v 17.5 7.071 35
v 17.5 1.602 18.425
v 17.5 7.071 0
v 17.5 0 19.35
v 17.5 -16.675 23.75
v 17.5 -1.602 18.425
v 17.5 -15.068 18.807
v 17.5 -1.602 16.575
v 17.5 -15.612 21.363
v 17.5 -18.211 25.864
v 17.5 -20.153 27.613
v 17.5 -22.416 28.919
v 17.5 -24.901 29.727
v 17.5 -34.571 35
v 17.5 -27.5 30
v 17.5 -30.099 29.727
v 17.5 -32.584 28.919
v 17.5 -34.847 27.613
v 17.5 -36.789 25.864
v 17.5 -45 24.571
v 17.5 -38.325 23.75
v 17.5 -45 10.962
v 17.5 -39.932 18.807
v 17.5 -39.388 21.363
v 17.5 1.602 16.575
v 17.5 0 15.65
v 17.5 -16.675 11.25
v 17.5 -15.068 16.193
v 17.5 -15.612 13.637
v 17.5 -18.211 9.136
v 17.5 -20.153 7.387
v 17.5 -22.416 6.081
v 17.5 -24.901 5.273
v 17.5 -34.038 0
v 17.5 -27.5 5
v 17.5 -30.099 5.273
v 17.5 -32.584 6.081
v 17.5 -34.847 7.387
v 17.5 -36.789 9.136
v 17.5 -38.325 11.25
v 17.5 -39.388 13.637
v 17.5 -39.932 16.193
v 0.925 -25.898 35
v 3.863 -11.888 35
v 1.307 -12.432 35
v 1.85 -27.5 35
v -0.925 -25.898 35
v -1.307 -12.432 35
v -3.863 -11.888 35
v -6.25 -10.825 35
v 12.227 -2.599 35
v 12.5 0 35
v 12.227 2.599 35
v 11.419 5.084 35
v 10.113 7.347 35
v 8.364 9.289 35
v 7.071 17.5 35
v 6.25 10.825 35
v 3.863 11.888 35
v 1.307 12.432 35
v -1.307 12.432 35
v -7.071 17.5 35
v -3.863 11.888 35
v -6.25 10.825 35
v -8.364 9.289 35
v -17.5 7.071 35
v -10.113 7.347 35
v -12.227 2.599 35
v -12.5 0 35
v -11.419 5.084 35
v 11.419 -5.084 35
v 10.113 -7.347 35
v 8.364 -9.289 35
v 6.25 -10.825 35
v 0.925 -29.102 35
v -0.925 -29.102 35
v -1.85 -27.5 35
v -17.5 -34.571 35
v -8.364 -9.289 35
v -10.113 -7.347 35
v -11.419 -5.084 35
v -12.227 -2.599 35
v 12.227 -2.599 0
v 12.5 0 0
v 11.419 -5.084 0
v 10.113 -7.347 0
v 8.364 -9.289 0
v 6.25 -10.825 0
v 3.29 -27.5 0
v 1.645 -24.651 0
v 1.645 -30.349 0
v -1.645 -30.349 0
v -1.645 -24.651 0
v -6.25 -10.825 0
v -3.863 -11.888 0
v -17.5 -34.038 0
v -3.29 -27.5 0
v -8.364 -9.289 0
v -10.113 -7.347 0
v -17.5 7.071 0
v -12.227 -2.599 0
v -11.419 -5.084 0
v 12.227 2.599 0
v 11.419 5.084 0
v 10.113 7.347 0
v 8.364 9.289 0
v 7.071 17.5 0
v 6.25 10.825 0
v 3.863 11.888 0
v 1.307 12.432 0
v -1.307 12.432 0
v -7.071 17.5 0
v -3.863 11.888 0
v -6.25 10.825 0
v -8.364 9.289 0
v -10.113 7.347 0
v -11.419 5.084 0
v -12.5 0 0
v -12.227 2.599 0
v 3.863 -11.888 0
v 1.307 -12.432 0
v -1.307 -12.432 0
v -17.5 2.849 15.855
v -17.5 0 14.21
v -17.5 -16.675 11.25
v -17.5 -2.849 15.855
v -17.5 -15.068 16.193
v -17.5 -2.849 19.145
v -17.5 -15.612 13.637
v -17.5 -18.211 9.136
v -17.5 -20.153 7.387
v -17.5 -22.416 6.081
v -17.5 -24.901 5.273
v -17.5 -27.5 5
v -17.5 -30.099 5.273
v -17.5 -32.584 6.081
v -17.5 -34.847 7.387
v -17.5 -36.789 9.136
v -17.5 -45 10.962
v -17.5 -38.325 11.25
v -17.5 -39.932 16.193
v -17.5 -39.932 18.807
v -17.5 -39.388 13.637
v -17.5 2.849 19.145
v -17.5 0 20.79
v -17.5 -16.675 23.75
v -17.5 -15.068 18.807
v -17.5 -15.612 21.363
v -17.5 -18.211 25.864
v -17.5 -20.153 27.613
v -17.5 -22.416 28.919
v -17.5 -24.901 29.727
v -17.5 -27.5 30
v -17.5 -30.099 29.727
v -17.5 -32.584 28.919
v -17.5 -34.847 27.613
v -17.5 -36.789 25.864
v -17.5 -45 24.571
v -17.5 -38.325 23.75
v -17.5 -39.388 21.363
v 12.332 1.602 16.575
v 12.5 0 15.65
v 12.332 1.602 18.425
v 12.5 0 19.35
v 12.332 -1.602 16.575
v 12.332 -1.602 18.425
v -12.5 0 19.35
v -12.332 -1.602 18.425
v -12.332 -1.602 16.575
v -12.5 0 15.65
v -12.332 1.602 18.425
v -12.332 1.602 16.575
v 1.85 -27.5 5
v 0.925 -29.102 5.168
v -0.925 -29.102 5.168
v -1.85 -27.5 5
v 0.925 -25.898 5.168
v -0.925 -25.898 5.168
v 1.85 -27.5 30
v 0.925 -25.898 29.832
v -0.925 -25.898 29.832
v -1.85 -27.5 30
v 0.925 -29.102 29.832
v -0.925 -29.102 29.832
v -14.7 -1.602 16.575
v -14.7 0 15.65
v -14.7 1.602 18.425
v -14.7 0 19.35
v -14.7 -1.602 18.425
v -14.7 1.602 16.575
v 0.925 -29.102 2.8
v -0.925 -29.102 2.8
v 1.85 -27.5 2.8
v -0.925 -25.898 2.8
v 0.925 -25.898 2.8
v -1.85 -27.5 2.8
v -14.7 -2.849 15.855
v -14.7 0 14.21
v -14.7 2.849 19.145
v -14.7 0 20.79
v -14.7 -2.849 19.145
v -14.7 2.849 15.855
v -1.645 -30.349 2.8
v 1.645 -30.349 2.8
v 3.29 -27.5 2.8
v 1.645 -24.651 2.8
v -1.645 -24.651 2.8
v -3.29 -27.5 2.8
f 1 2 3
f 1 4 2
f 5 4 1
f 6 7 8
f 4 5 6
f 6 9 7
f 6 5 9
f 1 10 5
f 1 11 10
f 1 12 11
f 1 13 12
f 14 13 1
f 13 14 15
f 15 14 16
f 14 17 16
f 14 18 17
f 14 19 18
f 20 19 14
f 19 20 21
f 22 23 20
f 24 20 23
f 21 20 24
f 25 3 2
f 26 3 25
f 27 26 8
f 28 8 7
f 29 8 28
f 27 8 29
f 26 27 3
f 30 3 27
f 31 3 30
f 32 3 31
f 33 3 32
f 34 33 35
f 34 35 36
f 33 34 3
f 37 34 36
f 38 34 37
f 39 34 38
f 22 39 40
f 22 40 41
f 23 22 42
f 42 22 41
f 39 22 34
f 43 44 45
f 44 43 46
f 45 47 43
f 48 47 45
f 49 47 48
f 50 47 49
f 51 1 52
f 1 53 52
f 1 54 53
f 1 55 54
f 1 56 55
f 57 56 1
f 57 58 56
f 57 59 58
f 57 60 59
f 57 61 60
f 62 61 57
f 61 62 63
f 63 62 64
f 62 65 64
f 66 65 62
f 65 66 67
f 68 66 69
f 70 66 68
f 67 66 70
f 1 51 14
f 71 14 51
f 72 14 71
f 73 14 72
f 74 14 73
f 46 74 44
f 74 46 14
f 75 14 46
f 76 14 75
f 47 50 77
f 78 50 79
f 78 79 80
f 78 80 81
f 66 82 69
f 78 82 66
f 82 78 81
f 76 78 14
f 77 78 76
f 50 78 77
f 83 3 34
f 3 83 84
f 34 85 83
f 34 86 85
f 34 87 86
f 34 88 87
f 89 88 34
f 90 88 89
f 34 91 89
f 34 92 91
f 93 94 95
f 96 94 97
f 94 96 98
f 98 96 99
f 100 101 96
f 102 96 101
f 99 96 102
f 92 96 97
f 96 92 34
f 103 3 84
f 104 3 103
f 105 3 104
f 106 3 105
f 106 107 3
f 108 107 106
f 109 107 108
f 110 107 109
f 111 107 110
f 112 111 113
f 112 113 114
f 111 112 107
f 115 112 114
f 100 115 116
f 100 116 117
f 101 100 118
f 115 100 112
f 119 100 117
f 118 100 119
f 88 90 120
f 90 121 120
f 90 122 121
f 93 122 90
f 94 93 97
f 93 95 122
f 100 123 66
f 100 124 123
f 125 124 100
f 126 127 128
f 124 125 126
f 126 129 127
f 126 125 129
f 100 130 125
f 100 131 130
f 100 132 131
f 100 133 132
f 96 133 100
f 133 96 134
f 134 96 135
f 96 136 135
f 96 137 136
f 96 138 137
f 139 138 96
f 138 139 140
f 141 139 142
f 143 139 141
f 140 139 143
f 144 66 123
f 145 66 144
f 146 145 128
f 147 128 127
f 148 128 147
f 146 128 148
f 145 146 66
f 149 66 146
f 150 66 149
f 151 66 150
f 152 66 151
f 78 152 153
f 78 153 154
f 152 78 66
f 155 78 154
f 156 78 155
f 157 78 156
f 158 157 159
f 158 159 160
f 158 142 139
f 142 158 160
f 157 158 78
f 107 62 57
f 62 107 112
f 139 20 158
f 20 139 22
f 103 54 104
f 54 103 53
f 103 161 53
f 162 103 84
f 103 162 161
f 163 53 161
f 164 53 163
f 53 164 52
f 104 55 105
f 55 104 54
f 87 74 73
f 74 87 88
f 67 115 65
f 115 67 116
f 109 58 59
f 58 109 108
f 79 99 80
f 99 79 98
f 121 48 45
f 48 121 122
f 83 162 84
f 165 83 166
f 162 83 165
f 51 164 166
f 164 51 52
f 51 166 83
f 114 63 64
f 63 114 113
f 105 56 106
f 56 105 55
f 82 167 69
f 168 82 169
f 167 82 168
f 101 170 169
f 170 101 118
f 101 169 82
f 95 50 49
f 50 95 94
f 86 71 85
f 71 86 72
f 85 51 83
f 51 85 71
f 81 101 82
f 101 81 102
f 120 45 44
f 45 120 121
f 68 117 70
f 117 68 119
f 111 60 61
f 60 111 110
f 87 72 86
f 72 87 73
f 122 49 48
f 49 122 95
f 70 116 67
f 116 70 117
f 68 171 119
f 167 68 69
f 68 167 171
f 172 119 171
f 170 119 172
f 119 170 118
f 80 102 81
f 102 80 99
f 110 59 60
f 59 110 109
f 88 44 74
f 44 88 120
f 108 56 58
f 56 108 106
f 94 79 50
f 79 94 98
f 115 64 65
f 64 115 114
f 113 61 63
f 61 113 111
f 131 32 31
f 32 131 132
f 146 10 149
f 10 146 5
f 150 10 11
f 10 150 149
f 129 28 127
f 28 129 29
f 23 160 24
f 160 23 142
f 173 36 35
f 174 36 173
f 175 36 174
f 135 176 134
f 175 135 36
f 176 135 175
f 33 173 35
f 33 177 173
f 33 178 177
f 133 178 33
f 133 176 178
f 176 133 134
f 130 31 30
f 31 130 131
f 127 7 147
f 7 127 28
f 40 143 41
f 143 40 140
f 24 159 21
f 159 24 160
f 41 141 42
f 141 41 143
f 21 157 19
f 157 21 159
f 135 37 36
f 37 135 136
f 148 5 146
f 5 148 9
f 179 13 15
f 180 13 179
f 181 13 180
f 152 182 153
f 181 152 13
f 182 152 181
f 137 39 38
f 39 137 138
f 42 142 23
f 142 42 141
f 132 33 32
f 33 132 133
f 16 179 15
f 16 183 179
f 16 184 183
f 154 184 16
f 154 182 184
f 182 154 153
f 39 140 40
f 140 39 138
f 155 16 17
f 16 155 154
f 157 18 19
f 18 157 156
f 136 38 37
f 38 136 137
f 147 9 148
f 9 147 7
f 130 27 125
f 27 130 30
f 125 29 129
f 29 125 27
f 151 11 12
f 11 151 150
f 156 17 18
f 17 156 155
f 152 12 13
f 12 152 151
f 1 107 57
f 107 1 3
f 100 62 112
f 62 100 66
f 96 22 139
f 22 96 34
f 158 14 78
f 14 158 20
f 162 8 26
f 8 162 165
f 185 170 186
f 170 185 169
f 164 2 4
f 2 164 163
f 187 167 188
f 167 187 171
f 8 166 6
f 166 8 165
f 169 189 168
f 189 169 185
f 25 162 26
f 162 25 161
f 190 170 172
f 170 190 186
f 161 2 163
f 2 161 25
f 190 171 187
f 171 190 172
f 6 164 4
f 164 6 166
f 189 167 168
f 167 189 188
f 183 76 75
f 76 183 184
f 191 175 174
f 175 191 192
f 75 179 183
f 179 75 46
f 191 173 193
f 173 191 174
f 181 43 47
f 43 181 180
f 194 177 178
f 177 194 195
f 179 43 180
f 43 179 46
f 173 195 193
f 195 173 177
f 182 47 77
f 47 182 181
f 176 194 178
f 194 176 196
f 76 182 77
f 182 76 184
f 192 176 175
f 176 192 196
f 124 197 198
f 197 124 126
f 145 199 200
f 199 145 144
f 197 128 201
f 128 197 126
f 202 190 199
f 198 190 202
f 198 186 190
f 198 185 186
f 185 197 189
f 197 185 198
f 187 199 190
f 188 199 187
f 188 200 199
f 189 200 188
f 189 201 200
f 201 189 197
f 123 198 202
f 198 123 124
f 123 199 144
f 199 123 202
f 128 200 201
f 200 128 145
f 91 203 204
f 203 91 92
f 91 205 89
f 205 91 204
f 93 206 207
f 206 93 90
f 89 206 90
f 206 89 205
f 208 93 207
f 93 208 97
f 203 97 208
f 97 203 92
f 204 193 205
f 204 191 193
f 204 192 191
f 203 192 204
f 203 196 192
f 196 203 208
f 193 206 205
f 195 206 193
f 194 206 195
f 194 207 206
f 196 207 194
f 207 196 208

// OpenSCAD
// file: Parameters.scad
//Main tube diameter [mm]
main_tube_outer_diameter = 25;
main_tube_inner_diameter = 21;

//Tube for undercarriage [mm]
tube_for_undercarriage_outer_diameter = 10;
tube_for_undercarriage_inner_diameter = 5;

//Screw diameter in model 666_1019 [mm]
M4_screw_diameter=4;


//Screw diameter in model 666_1004 [mm]
M3_5_screw_diameter = 3.7;

//Nut in model 666_1004 [mm]
Nut_height = 2.8;
Nut_diameter = 6.58;
// main file
include <./Parameters.scad>
		
wall_thickness=main_tube_outer_diameter/5;
thickness_between_tubes=main_tube_outer_diameter/10;			
width=main_tube_outer_diameter+2*wall_thickness;
depth=main_tube_outer_diameter*2+2*wall_thickness+thickness_between_tubes;
height=width;
radius=main_tube_outer_diameter/2;



difference(){

translate([-(width/2),-(depth-radius-wall_thickness),0])
cube([width,depth,height]);

    //tube

    cylinder(h=height,r1=radius,r2=radius);

    translate([-(radius+wall_thickness),-(main_tube_outer_diameter+thickness_between_tubes),radius+wall_thickness])
    rotate([0,90,0])
    cylinder(h=height,r1=radius,r2=radius);
    
    //bevelled edge

    translate([width/2+sqrt(2)*wall_thickness,0,0])
    rotate([0,0,45])
    cube([width,width,height]);
    
    translate([-(width/2)-sqrt(2)*wall_thickness,0,0])
    rotate([0,0,45])
    cube([width, width,height]); 
    
    translate([-(width/2),- depth + height/2-sqrt(2)*wall_thickness,-height+(sqrt(2)*wall_thickness)/2])
    rotate([45,0,0])
    cube([width,height,height]);
   
    translate([-(width/2), -depth + height/2-sqrt(2)*wall_thickness,height/2])  
    rotate([45,0,0])
    cube([width,height,height]);  

   	//screw

   	translate([-width/2,0,height/2])
	rotate ([0,90,0])   
    cylinder(h = width, r1 = M3_5_screw_diameter/2, r2 = M3_5_screw_diameter/2);

    translate ([0,- (main_tube_outer_diameter+thickness_between_tubes),0])
    cylinder (h = height, r1 = M3_5_screw_diameter/2, r2 = M3_5_screw_diameter/2);
			
    //nut

    translate([-width/2,0,height/2])
    rotate ([0,90,0])
    cylinder (h = Nut_height, r1 = Nut_diameter/2 ,r2 = Nut_diameter/2, $fn = 6);

    translate([0, -(main_tube_outer_diameter+thickness_between_tubes),0])
    cylinder (h = Nut_height, r1 = Nut_diameter/2, r2 = Nut_diameter/2, $fn = 6);

    }
